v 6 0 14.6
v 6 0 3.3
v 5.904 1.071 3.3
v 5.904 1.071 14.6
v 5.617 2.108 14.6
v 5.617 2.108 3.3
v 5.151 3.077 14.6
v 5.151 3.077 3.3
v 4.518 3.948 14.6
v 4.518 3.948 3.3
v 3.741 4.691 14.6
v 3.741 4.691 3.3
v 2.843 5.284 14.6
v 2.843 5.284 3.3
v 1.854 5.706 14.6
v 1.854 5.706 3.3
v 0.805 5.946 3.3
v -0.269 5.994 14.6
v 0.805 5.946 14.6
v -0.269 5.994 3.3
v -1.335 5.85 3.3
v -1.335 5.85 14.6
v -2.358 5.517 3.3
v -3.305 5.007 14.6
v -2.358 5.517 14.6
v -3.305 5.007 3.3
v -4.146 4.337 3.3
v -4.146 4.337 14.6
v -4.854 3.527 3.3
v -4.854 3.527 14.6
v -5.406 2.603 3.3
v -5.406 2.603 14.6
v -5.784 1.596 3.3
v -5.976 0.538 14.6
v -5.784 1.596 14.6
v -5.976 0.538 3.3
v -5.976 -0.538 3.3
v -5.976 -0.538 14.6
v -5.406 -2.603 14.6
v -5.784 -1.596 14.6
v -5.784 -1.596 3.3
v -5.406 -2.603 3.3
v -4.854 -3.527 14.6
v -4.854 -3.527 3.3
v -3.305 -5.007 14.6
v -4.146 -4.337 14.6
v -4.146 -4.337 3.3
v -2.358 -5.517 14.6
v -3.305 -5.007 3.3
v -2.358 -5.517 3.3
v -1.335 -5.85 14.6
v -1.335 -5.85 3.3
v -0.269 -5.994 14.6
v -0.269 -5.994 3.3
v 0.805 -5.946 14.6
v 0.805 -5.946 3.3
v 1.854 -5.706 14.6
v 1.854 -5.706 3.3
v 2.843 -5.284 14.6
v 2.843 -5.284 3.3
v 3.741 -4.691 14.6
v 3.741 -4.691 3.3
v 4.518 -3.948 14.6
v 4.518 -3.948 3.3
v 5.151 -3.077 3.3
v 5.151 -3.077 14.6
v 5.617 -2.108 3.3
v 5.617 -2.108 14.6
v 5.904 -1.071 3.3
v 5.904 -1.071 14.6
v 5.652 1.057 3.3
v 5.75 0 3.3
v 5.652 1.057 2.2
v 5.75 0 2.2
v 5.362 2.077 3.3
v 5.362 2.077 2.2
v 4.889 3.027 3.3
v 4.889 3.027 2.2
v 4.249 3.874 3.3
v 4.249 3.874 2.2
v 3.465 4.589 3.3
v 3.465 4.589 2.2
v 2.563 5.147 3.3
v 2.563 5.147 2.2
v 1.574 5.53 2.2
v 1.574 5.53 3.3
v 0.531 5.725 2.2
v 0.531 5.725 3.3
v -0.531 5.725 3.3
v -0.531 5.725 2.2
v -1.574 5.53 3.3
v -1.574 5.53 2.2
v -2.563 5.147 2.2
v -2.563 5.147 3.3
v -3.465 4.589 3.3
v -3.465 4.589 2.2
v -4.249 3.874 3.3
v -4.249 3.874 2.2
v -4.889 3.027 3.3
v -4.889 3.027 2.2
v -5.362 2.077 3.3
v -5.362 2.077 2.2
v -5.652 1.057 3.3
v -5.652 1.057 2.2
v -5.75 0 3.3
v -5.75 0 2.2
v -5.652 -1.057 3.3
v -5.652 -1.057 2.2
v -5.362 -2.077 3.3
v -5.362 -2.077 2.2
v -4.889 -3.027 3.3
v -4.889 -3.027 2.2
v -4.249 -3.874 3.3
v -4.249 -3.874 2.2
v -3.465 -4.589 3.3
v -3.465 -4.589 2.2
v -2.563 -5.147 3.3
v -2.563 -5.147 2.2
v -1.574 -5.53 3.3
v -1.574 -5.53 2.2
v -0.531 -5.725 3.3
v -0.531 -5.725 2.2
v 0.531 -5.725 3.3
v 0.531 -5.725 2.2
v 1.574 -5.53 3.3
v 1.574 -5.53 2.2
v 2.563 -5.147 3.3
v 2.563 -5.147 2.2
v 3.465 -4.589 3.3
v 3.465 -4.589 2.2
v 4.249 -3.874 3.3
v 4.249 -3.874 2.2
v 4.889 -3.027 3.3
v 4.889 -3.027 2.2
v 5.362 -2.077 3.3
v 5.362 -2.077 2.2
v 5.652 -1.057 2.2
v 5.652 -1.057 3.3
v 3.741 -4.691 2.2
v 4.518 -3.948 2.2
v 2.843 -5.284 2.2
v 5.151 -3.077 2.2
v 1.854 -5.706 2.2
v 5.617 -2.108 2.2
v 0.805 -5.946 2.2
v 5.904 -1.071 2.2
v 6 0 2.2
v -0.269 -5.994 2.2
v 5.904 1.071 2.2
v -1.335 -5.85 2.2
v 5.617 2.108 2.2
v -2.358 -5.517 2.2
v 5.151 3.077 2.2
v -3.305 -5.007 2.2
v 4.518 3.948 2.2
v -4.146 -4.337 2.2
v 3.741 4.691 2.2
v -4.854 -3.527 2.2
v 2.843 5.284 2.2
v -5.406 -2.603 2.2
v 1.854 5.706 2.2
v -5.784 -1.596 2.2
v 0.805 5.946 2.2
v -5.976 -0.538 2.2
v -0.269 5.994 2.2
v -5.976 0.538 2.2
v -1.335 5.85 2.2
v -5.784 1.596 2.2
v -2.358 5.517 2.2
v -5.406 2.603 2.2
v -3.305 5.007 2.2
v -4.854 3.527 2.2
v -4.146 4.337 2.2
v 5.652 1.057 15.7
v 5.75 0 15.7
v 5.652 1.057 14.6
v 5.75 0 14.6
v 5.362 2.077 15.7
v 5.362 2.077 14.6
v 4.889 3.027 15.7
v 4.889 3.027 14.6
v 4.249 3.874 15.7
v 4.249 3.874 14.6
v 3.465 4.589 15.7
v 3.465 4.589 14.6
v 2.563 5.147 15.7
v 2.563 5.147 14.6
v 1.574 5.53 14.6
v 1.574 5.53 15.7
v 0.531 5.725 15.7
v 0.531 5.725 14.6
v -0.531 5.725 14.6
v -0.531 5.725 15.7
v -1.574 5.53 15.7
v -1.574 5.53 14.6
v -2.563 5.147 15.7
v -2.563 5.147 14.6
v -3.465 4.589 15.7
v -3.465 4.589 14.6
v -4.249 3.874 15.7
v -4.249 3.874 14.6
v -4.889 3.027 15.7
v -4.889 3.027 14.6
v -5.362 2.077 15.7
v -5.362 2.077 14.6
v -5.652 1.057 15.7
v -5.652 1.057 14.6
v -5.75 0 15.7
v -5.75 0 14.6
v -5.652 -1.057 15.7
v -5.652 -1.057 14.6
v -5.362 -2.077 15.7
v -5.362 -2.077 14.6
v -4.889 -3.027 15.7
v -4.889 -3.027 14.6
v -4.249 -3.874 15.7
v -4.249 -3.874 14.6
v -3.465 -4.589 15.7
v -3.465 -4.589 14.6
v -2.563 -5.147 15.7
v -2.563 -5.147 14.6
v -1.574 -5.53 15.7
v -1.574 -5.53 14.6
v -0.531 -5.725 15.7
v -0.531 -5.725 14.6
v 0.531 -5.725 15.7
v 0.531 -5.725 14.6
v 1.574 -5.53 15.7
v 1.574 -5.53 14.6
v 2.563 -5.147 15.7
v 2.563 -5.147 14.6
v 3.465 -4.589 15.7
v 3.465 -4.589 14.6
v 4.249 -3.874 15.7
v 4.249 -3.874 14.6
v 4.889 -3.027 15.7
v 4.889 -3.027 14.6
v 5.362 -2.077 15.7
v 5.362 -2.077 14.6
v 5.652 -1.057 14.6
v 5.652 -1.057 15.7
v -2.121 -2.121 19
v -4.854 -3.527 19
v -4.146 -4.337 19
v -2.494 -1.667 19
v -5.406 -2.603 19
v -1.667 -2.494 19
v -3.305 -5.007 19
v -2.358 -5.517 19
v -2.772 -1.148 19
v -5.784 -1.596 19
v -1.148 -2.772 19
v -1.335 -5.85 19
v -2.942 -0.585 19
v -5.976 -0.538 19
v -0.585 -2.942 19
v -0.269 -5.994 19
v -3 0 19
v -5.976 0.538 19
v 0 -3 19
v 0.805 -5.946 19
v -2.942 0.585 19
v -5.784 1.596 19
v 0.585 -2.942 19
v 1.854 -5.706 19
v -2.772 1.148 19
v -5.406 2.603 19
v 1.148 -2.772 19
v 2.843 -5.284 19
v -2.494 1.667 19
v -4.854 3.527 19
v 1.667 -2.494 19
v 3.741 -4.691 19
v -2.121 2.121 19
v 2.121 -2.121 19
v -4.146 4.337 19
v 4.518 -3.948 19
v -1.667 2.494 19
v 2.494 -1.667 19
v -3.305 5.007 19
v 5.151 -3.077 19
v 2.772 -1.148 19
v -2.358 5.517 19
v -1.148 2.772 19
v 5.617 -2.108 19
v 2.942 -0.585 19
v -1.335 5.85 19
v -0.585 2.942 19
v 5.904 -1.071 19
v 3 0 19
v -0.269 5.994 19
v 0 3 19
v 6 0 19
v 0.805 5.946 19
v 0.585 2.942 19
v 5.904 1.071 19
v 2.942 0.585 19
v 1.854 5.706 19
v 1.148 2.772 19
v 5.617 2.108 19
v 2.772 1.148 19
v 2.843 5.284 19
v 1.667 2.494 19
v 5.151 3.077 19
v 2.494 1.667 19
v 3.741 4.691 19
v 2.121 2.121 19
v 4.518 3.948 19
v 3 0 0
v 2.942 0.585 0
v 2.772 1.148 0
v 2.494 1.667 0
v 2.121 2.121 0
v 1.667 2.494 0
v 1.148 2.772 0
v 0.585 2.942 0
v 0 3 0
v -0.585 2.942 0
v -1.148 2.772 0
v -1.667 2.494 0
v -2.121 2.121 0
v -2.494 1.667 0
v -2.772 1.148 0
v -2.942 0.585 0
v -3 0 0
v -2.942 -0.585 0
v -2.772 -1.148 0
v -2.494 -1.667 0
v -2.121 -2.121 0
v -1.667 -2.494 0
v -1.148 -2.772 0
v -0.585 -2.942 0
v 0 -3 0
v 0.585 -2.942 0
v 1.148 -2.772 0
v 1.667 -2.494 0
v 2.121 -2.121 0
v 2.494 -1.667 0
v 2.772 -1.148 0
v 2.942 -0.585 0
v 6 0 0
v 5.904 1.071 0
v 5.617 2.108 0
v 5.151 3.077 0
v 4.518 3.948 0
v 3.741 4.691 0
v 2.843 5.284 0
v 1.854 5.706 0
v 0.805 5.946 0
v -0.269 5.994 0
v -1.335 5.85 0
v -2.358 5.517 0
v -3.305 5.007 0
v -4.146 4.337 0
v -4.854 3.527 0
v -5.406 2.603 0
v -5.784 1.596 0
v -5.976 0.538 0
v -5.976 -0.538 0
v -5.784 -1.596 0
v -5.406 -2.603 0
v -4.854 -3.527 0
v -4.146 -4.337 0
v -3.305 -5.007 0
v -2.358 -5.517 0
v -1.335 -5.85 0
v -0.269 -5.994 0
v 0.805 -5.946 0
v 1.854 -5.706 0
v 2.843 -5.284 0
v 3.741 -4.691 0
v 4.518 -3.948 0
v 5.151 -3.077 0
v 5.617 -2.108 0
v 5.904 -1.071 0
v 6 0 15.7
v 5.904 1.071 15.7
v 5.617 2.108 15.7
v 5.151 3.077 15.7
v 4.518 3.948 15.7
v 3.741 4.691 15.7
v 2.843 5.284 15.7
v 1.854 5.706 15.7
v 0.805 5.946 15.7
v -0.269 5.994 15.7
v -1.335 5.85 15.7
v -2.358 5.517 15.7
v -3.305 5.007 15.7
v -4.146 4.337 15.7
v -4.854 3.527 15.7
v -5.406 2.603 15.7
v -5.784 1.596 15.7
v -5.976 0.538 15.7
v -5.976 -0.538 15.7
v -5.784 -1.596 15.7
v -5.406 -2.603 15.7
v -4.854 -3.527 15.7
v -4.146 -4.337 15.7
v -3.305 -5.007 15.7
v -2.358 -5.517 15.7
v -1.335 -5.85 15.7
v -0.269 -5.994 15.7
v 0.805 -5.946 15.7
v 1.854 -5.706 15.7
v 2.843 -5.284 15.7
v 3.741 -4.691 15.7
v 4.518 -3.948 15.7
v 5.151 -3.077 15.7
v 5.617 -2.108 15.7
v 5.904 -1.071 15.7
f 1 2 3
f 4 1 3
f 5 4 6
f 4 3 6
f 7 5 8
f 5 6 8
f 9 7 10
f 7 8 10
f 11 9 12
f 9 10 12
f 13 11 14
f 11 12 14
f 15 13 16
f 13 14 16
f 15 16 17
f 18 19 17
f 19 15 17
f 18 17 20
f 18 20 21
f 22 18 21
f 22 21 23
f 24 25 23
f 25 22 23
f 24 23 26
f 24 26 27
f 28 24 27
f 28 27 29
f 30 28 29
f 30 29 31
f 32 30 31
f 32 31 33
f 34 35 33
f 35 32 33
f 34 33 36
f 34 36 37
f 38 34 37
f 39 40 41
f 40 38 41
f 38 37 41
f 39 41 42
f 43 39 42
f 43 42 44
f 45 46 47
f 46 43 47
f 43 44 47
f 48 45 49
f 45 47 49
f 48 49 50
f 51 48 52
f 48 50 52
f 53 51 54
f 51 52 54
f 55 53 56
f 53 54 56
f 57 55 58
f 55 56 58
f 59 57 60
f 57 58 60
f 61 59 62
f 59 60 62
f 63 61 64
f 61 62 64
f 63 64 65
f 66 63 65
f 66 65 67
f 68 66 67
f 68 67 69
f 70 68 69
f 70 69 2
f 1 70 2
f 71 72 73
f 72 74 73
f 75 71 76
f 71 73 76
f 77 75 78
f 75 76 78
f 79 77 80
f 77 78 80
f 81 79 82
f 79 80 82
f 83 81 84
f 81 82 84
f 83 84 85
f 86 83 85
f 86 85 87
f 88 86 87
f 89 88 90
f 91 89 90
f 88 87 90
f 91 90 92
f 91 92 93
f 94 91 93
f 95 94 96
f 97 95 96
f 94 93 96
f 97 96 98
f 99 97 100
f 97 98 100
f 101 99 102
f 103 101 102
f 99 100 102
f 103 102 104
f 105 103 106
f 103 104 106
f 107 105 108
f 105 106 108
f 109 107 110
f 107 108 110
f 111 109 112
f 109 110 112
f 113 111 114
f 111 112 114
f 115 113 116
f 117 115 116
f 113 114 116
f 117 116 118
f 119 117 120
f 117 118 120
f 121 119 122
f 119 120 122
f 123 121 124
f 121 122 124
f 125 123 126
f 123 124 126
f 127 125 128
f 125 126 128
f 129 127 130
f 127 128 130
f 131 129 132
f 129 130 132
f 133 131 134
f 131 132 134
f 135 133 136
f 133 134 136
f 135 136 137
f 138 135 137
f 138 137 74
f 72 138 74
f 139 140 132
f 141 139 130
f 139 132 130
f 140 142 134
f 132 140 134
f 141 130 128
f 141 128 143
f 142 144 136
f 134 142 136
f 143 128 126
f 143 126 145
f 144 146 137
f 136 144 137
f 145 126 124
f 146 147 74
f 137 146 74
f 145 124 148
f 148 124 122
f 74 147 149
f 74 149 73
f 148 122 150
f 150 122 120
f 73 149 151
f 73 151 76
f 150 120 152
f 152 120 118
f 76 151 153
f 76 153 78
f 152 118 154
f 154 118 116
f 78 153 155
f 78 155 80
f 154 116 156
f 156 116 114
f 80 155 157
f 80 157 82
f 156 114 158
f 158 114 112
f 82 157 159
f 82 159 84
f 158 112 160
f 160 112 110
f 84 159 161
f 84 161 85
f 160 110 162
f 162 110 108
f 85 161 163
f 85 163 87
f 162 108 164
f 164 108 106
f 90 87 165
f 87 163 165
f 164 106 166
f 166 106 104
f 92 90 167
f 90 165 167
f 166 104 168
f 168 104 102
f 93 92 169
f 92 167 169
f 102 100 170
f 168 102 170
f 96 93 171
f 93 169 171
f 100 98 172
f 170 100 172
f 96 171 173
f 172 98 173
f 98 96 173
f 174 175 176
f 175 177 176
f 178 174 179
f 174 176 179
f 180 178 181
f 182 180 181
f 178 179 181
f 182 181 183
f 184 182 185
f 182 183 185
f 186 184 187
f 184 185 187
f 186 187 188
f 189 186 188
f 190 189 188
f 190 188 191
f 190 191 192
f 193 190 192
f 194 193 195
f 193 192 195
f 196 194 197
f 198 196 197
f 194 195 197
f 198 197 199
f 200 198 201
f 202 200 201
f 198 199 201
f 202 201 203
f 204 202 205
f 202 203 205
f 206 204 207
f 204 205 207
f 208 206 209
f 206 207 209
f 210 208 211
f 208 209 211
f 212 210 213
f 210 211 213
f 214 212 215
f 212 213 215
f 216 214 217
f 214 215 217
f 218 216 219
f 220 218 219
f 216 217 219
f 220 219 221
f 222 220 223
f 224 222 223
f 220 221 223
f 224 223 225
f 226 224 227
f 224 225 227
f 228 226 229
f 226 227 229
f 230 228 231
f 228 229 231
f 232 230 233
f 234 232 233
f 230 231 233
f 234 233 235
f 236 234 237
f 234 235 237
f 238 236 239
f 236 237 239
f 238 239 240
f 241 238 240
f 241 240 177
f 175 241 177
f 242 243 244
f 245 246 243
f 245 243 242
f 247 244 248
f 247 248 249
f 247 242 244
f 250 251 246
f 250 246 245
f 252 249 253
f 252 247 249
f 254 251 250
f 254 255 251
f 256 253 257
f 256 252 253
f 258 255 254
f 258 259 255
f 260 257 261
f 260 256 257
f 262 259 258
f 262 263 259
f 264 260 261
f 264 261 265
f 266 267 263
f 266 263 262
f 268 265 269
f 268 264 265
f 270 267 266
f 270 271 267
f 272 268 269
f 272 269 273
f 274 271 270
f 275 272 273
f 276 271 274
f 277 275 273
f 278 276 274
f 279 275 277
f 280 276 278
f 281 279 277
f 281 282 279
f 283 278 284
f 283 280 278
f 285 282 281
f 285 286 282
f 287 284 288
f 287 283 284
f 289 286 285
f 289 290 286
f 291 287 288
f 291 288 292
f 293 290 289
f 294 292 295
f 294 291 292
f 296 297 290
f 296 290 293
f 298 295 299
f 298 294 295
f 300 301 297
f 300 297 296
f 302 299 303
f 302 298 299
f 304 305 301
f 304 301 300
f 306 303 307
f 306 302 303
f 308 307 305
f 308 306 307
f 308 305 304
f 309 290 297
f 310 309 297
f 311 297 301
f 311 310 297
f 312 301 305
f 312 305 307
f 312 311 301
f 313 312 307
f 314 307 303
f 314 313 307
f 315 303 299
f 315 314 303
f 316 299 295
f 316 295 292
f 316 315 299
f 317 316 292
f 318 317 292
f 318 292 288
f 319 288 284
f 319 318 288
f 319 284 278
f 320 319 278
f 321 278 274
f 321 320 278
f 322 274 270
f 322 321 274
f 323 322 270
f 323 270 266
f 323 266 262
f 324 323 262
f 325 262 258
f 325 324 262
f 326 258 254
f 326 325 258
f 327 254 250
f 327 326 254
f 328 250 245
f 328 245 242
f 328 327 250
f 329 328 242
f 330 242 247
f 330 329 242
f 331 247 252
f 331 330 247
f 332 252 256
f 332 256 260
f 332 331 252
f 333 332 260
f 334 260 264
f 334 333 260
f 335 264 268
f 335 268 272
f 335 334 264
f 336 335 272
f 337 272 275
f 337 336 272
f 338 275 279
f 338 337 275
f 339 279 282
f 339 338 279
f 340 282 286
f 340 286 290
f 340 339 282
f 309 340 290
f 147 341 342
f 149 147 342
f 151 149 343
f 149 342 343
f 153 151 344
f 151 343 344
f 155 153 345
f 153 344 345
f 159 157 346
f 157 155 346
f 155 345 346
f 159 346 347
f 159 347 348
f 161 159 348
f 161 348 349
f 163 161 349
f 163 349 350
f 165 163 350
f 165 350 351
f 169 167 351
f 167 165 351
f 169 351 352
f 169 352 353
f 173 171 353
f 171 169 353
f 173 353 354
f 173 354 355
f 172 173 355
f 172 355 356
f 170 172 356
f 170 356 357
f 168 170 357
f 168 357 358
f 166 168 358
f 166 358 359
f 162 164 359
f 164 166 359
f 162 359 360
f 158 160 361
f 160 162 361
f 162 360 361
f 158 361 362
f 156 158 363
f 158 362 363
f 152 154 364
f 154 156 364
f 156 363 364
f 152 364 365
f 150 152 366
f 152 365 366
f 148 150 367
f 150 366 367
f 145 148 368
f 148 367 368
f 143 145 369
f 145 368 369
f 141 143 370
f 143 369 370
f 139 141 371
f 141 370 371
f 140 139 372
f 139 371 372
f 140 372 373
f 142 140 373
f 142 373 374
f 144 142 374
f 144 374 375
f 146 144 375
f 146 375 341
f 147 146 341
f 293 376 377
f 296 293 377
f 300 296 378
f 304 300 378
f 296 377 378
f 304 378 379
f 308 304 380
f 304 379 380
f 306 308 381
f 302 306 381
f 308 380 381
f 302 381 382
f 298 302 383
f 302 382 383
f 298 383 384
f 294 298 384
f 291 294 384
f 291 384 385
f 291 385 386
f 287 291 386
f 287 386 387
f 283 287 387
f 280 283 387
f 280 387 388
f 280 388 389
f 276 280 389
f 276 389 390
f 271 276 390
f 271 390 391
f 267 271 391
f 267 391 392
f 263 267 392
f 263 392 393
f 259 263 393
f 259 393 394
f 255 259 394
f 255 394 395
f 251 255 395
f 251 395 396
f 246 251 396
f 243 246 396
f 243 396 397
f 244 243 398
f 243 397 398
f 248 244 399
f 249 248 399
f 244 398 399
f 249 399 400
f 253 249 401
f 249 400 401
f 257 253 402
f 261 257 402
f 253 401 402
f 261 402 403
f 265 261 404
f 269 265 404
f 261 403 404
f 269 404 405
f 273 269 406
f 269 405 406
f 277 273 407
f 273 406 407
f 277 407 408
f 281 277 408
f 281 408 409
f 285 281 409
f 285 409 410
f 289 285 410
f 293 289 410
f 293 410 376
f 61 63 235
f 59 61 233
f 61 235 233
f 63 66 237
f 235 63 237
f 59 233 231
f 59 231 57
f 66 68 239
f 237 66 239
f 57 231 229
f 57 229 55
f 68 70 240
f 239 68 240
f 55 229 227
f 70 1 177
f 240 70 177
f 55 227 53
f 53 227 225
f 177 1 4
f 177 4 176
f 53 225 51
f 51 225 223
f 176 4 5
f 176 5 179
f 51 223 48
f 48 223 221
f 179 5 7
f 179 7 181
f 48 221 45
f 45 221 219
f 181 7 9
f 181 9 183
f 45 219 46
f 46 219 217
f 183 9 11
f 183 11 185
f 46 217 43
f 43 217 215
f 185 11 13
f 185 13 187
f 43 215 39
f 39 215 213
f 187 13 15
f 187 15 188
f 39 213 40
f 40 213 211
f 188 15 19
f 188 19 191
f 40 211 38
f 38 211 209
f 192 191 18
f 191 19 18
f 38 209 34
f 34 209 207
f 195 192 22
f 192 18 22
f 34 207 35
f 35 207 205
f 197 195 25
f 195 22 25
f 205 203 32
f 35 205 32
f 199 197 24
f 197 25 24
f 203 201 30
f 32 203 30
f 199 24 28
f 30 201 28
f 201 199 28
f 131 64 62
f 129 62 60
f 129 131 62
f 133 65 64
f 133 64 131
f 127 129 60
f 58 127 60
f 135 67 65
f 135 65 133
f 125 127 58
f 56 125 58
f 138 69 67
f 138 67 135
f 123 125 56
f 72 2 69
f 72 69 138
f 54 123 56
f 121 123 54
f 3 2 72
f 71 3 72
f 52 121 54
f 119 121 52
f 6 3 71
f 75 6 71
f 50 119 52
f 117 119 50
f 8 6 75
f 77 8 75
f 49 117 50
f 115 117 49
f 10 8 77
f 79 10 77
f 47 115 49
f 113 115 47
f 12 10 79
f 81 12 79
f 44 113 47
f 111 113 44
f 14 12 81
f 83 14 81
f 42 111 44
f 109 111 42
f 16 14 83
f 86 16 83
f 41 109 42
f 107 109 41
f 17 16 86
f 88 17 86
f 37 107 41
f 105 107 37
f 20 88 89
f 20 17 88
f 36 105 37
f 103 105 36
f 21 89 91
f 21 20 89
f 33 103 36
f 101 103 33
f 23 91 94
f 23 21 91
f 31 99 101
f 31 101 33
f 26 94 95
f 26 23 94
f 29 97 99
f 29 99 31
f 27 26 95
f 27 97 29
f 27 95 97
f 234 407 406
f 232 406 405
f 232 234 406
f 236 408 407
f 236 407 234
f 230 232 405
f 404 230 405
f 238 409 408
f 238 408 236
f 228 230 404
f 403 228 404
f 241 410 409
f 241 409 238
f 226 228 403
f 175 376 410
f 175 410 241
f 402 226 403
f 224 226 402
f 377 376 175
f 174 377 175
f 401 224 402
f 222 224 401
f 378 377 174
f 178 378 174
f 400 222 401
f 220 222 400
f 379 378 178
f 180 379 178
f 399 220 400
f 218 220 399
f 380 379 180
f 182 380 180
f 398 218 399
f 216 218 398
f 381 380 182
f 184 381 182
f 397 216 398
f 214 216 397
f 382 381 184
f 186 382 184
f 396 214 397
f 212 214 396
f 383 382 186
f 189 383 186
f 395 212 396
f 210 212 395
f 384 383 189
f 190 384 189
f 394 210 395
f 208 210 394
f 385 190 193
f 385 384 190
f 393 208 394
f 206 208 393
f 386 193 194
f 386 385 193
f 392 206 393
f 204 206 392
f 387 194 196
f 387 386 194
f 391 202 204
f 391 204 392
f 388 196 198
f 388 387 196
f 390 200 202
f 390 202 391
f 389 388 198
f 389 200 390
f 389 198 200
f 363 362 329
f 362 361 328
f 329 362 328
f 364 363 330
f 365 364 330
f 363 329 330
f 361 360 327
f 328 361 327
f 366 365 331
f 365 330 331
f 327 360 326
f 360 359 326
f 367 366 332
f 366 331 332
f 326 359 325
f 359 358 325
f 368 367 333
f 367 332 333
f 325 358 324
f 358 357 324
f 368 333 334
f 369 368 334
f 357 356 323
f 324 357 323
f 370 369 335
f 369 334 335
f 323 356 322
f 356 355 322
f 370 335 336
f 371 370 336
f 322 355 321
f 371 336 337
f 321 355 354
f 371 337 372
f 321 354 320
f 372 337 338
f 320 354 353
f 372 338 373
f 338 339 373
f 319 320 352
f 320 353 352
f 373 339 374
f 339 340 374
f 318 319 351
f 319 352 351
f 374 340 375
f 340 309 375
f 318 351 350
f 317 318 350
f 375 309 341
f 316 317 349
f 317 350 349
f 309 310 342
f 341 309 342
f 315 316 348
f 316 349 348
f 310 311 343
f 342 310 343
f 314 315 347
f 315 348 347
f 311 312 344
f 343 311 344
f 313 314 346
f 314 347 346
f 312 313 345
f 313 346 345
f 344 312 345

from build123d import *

# Parameters (mm, degrees)
SKETCH1_R           = 6
SKETCH1_R_2         = 3
BOSS_EXTRUDE1_DEPTH = 19
SKETCH2_W           = 1.849781756
SKETCH2_H           = 1.1


with BuildPart() as part:
    # Sketch1 → Boss-Extrude1 (new body)
    with BuildSketch(Plane.XY):
        Circle(SKETCH1_R)
        Circle(SKETCH1_R_2, mode=Mode.SUBTRACT)
    extrude(amount=BOSS_EXTRUDE1_DEPTH)

    # Sketch2 → Cut-Revolve1 (revolve, cut)
    with BuildSketch(Plane(origin=(0, 0, 0), x_dir=(1, 0, 0), z_dir=(0, 1, 0))):
        with Locations((6.674890878, -2.75)):
            Rectangle(SKETCH2_W, SKETCH2_H)
        with Locations((6.674890878, -15.15)):
            Rectangle(SKETCH2_W, SKETCH2_H)
    revolve(axis=Axis((0, 0, 0), (0, 0, 1)), mode=Mode.SUBTRACT)


solid = part.part
